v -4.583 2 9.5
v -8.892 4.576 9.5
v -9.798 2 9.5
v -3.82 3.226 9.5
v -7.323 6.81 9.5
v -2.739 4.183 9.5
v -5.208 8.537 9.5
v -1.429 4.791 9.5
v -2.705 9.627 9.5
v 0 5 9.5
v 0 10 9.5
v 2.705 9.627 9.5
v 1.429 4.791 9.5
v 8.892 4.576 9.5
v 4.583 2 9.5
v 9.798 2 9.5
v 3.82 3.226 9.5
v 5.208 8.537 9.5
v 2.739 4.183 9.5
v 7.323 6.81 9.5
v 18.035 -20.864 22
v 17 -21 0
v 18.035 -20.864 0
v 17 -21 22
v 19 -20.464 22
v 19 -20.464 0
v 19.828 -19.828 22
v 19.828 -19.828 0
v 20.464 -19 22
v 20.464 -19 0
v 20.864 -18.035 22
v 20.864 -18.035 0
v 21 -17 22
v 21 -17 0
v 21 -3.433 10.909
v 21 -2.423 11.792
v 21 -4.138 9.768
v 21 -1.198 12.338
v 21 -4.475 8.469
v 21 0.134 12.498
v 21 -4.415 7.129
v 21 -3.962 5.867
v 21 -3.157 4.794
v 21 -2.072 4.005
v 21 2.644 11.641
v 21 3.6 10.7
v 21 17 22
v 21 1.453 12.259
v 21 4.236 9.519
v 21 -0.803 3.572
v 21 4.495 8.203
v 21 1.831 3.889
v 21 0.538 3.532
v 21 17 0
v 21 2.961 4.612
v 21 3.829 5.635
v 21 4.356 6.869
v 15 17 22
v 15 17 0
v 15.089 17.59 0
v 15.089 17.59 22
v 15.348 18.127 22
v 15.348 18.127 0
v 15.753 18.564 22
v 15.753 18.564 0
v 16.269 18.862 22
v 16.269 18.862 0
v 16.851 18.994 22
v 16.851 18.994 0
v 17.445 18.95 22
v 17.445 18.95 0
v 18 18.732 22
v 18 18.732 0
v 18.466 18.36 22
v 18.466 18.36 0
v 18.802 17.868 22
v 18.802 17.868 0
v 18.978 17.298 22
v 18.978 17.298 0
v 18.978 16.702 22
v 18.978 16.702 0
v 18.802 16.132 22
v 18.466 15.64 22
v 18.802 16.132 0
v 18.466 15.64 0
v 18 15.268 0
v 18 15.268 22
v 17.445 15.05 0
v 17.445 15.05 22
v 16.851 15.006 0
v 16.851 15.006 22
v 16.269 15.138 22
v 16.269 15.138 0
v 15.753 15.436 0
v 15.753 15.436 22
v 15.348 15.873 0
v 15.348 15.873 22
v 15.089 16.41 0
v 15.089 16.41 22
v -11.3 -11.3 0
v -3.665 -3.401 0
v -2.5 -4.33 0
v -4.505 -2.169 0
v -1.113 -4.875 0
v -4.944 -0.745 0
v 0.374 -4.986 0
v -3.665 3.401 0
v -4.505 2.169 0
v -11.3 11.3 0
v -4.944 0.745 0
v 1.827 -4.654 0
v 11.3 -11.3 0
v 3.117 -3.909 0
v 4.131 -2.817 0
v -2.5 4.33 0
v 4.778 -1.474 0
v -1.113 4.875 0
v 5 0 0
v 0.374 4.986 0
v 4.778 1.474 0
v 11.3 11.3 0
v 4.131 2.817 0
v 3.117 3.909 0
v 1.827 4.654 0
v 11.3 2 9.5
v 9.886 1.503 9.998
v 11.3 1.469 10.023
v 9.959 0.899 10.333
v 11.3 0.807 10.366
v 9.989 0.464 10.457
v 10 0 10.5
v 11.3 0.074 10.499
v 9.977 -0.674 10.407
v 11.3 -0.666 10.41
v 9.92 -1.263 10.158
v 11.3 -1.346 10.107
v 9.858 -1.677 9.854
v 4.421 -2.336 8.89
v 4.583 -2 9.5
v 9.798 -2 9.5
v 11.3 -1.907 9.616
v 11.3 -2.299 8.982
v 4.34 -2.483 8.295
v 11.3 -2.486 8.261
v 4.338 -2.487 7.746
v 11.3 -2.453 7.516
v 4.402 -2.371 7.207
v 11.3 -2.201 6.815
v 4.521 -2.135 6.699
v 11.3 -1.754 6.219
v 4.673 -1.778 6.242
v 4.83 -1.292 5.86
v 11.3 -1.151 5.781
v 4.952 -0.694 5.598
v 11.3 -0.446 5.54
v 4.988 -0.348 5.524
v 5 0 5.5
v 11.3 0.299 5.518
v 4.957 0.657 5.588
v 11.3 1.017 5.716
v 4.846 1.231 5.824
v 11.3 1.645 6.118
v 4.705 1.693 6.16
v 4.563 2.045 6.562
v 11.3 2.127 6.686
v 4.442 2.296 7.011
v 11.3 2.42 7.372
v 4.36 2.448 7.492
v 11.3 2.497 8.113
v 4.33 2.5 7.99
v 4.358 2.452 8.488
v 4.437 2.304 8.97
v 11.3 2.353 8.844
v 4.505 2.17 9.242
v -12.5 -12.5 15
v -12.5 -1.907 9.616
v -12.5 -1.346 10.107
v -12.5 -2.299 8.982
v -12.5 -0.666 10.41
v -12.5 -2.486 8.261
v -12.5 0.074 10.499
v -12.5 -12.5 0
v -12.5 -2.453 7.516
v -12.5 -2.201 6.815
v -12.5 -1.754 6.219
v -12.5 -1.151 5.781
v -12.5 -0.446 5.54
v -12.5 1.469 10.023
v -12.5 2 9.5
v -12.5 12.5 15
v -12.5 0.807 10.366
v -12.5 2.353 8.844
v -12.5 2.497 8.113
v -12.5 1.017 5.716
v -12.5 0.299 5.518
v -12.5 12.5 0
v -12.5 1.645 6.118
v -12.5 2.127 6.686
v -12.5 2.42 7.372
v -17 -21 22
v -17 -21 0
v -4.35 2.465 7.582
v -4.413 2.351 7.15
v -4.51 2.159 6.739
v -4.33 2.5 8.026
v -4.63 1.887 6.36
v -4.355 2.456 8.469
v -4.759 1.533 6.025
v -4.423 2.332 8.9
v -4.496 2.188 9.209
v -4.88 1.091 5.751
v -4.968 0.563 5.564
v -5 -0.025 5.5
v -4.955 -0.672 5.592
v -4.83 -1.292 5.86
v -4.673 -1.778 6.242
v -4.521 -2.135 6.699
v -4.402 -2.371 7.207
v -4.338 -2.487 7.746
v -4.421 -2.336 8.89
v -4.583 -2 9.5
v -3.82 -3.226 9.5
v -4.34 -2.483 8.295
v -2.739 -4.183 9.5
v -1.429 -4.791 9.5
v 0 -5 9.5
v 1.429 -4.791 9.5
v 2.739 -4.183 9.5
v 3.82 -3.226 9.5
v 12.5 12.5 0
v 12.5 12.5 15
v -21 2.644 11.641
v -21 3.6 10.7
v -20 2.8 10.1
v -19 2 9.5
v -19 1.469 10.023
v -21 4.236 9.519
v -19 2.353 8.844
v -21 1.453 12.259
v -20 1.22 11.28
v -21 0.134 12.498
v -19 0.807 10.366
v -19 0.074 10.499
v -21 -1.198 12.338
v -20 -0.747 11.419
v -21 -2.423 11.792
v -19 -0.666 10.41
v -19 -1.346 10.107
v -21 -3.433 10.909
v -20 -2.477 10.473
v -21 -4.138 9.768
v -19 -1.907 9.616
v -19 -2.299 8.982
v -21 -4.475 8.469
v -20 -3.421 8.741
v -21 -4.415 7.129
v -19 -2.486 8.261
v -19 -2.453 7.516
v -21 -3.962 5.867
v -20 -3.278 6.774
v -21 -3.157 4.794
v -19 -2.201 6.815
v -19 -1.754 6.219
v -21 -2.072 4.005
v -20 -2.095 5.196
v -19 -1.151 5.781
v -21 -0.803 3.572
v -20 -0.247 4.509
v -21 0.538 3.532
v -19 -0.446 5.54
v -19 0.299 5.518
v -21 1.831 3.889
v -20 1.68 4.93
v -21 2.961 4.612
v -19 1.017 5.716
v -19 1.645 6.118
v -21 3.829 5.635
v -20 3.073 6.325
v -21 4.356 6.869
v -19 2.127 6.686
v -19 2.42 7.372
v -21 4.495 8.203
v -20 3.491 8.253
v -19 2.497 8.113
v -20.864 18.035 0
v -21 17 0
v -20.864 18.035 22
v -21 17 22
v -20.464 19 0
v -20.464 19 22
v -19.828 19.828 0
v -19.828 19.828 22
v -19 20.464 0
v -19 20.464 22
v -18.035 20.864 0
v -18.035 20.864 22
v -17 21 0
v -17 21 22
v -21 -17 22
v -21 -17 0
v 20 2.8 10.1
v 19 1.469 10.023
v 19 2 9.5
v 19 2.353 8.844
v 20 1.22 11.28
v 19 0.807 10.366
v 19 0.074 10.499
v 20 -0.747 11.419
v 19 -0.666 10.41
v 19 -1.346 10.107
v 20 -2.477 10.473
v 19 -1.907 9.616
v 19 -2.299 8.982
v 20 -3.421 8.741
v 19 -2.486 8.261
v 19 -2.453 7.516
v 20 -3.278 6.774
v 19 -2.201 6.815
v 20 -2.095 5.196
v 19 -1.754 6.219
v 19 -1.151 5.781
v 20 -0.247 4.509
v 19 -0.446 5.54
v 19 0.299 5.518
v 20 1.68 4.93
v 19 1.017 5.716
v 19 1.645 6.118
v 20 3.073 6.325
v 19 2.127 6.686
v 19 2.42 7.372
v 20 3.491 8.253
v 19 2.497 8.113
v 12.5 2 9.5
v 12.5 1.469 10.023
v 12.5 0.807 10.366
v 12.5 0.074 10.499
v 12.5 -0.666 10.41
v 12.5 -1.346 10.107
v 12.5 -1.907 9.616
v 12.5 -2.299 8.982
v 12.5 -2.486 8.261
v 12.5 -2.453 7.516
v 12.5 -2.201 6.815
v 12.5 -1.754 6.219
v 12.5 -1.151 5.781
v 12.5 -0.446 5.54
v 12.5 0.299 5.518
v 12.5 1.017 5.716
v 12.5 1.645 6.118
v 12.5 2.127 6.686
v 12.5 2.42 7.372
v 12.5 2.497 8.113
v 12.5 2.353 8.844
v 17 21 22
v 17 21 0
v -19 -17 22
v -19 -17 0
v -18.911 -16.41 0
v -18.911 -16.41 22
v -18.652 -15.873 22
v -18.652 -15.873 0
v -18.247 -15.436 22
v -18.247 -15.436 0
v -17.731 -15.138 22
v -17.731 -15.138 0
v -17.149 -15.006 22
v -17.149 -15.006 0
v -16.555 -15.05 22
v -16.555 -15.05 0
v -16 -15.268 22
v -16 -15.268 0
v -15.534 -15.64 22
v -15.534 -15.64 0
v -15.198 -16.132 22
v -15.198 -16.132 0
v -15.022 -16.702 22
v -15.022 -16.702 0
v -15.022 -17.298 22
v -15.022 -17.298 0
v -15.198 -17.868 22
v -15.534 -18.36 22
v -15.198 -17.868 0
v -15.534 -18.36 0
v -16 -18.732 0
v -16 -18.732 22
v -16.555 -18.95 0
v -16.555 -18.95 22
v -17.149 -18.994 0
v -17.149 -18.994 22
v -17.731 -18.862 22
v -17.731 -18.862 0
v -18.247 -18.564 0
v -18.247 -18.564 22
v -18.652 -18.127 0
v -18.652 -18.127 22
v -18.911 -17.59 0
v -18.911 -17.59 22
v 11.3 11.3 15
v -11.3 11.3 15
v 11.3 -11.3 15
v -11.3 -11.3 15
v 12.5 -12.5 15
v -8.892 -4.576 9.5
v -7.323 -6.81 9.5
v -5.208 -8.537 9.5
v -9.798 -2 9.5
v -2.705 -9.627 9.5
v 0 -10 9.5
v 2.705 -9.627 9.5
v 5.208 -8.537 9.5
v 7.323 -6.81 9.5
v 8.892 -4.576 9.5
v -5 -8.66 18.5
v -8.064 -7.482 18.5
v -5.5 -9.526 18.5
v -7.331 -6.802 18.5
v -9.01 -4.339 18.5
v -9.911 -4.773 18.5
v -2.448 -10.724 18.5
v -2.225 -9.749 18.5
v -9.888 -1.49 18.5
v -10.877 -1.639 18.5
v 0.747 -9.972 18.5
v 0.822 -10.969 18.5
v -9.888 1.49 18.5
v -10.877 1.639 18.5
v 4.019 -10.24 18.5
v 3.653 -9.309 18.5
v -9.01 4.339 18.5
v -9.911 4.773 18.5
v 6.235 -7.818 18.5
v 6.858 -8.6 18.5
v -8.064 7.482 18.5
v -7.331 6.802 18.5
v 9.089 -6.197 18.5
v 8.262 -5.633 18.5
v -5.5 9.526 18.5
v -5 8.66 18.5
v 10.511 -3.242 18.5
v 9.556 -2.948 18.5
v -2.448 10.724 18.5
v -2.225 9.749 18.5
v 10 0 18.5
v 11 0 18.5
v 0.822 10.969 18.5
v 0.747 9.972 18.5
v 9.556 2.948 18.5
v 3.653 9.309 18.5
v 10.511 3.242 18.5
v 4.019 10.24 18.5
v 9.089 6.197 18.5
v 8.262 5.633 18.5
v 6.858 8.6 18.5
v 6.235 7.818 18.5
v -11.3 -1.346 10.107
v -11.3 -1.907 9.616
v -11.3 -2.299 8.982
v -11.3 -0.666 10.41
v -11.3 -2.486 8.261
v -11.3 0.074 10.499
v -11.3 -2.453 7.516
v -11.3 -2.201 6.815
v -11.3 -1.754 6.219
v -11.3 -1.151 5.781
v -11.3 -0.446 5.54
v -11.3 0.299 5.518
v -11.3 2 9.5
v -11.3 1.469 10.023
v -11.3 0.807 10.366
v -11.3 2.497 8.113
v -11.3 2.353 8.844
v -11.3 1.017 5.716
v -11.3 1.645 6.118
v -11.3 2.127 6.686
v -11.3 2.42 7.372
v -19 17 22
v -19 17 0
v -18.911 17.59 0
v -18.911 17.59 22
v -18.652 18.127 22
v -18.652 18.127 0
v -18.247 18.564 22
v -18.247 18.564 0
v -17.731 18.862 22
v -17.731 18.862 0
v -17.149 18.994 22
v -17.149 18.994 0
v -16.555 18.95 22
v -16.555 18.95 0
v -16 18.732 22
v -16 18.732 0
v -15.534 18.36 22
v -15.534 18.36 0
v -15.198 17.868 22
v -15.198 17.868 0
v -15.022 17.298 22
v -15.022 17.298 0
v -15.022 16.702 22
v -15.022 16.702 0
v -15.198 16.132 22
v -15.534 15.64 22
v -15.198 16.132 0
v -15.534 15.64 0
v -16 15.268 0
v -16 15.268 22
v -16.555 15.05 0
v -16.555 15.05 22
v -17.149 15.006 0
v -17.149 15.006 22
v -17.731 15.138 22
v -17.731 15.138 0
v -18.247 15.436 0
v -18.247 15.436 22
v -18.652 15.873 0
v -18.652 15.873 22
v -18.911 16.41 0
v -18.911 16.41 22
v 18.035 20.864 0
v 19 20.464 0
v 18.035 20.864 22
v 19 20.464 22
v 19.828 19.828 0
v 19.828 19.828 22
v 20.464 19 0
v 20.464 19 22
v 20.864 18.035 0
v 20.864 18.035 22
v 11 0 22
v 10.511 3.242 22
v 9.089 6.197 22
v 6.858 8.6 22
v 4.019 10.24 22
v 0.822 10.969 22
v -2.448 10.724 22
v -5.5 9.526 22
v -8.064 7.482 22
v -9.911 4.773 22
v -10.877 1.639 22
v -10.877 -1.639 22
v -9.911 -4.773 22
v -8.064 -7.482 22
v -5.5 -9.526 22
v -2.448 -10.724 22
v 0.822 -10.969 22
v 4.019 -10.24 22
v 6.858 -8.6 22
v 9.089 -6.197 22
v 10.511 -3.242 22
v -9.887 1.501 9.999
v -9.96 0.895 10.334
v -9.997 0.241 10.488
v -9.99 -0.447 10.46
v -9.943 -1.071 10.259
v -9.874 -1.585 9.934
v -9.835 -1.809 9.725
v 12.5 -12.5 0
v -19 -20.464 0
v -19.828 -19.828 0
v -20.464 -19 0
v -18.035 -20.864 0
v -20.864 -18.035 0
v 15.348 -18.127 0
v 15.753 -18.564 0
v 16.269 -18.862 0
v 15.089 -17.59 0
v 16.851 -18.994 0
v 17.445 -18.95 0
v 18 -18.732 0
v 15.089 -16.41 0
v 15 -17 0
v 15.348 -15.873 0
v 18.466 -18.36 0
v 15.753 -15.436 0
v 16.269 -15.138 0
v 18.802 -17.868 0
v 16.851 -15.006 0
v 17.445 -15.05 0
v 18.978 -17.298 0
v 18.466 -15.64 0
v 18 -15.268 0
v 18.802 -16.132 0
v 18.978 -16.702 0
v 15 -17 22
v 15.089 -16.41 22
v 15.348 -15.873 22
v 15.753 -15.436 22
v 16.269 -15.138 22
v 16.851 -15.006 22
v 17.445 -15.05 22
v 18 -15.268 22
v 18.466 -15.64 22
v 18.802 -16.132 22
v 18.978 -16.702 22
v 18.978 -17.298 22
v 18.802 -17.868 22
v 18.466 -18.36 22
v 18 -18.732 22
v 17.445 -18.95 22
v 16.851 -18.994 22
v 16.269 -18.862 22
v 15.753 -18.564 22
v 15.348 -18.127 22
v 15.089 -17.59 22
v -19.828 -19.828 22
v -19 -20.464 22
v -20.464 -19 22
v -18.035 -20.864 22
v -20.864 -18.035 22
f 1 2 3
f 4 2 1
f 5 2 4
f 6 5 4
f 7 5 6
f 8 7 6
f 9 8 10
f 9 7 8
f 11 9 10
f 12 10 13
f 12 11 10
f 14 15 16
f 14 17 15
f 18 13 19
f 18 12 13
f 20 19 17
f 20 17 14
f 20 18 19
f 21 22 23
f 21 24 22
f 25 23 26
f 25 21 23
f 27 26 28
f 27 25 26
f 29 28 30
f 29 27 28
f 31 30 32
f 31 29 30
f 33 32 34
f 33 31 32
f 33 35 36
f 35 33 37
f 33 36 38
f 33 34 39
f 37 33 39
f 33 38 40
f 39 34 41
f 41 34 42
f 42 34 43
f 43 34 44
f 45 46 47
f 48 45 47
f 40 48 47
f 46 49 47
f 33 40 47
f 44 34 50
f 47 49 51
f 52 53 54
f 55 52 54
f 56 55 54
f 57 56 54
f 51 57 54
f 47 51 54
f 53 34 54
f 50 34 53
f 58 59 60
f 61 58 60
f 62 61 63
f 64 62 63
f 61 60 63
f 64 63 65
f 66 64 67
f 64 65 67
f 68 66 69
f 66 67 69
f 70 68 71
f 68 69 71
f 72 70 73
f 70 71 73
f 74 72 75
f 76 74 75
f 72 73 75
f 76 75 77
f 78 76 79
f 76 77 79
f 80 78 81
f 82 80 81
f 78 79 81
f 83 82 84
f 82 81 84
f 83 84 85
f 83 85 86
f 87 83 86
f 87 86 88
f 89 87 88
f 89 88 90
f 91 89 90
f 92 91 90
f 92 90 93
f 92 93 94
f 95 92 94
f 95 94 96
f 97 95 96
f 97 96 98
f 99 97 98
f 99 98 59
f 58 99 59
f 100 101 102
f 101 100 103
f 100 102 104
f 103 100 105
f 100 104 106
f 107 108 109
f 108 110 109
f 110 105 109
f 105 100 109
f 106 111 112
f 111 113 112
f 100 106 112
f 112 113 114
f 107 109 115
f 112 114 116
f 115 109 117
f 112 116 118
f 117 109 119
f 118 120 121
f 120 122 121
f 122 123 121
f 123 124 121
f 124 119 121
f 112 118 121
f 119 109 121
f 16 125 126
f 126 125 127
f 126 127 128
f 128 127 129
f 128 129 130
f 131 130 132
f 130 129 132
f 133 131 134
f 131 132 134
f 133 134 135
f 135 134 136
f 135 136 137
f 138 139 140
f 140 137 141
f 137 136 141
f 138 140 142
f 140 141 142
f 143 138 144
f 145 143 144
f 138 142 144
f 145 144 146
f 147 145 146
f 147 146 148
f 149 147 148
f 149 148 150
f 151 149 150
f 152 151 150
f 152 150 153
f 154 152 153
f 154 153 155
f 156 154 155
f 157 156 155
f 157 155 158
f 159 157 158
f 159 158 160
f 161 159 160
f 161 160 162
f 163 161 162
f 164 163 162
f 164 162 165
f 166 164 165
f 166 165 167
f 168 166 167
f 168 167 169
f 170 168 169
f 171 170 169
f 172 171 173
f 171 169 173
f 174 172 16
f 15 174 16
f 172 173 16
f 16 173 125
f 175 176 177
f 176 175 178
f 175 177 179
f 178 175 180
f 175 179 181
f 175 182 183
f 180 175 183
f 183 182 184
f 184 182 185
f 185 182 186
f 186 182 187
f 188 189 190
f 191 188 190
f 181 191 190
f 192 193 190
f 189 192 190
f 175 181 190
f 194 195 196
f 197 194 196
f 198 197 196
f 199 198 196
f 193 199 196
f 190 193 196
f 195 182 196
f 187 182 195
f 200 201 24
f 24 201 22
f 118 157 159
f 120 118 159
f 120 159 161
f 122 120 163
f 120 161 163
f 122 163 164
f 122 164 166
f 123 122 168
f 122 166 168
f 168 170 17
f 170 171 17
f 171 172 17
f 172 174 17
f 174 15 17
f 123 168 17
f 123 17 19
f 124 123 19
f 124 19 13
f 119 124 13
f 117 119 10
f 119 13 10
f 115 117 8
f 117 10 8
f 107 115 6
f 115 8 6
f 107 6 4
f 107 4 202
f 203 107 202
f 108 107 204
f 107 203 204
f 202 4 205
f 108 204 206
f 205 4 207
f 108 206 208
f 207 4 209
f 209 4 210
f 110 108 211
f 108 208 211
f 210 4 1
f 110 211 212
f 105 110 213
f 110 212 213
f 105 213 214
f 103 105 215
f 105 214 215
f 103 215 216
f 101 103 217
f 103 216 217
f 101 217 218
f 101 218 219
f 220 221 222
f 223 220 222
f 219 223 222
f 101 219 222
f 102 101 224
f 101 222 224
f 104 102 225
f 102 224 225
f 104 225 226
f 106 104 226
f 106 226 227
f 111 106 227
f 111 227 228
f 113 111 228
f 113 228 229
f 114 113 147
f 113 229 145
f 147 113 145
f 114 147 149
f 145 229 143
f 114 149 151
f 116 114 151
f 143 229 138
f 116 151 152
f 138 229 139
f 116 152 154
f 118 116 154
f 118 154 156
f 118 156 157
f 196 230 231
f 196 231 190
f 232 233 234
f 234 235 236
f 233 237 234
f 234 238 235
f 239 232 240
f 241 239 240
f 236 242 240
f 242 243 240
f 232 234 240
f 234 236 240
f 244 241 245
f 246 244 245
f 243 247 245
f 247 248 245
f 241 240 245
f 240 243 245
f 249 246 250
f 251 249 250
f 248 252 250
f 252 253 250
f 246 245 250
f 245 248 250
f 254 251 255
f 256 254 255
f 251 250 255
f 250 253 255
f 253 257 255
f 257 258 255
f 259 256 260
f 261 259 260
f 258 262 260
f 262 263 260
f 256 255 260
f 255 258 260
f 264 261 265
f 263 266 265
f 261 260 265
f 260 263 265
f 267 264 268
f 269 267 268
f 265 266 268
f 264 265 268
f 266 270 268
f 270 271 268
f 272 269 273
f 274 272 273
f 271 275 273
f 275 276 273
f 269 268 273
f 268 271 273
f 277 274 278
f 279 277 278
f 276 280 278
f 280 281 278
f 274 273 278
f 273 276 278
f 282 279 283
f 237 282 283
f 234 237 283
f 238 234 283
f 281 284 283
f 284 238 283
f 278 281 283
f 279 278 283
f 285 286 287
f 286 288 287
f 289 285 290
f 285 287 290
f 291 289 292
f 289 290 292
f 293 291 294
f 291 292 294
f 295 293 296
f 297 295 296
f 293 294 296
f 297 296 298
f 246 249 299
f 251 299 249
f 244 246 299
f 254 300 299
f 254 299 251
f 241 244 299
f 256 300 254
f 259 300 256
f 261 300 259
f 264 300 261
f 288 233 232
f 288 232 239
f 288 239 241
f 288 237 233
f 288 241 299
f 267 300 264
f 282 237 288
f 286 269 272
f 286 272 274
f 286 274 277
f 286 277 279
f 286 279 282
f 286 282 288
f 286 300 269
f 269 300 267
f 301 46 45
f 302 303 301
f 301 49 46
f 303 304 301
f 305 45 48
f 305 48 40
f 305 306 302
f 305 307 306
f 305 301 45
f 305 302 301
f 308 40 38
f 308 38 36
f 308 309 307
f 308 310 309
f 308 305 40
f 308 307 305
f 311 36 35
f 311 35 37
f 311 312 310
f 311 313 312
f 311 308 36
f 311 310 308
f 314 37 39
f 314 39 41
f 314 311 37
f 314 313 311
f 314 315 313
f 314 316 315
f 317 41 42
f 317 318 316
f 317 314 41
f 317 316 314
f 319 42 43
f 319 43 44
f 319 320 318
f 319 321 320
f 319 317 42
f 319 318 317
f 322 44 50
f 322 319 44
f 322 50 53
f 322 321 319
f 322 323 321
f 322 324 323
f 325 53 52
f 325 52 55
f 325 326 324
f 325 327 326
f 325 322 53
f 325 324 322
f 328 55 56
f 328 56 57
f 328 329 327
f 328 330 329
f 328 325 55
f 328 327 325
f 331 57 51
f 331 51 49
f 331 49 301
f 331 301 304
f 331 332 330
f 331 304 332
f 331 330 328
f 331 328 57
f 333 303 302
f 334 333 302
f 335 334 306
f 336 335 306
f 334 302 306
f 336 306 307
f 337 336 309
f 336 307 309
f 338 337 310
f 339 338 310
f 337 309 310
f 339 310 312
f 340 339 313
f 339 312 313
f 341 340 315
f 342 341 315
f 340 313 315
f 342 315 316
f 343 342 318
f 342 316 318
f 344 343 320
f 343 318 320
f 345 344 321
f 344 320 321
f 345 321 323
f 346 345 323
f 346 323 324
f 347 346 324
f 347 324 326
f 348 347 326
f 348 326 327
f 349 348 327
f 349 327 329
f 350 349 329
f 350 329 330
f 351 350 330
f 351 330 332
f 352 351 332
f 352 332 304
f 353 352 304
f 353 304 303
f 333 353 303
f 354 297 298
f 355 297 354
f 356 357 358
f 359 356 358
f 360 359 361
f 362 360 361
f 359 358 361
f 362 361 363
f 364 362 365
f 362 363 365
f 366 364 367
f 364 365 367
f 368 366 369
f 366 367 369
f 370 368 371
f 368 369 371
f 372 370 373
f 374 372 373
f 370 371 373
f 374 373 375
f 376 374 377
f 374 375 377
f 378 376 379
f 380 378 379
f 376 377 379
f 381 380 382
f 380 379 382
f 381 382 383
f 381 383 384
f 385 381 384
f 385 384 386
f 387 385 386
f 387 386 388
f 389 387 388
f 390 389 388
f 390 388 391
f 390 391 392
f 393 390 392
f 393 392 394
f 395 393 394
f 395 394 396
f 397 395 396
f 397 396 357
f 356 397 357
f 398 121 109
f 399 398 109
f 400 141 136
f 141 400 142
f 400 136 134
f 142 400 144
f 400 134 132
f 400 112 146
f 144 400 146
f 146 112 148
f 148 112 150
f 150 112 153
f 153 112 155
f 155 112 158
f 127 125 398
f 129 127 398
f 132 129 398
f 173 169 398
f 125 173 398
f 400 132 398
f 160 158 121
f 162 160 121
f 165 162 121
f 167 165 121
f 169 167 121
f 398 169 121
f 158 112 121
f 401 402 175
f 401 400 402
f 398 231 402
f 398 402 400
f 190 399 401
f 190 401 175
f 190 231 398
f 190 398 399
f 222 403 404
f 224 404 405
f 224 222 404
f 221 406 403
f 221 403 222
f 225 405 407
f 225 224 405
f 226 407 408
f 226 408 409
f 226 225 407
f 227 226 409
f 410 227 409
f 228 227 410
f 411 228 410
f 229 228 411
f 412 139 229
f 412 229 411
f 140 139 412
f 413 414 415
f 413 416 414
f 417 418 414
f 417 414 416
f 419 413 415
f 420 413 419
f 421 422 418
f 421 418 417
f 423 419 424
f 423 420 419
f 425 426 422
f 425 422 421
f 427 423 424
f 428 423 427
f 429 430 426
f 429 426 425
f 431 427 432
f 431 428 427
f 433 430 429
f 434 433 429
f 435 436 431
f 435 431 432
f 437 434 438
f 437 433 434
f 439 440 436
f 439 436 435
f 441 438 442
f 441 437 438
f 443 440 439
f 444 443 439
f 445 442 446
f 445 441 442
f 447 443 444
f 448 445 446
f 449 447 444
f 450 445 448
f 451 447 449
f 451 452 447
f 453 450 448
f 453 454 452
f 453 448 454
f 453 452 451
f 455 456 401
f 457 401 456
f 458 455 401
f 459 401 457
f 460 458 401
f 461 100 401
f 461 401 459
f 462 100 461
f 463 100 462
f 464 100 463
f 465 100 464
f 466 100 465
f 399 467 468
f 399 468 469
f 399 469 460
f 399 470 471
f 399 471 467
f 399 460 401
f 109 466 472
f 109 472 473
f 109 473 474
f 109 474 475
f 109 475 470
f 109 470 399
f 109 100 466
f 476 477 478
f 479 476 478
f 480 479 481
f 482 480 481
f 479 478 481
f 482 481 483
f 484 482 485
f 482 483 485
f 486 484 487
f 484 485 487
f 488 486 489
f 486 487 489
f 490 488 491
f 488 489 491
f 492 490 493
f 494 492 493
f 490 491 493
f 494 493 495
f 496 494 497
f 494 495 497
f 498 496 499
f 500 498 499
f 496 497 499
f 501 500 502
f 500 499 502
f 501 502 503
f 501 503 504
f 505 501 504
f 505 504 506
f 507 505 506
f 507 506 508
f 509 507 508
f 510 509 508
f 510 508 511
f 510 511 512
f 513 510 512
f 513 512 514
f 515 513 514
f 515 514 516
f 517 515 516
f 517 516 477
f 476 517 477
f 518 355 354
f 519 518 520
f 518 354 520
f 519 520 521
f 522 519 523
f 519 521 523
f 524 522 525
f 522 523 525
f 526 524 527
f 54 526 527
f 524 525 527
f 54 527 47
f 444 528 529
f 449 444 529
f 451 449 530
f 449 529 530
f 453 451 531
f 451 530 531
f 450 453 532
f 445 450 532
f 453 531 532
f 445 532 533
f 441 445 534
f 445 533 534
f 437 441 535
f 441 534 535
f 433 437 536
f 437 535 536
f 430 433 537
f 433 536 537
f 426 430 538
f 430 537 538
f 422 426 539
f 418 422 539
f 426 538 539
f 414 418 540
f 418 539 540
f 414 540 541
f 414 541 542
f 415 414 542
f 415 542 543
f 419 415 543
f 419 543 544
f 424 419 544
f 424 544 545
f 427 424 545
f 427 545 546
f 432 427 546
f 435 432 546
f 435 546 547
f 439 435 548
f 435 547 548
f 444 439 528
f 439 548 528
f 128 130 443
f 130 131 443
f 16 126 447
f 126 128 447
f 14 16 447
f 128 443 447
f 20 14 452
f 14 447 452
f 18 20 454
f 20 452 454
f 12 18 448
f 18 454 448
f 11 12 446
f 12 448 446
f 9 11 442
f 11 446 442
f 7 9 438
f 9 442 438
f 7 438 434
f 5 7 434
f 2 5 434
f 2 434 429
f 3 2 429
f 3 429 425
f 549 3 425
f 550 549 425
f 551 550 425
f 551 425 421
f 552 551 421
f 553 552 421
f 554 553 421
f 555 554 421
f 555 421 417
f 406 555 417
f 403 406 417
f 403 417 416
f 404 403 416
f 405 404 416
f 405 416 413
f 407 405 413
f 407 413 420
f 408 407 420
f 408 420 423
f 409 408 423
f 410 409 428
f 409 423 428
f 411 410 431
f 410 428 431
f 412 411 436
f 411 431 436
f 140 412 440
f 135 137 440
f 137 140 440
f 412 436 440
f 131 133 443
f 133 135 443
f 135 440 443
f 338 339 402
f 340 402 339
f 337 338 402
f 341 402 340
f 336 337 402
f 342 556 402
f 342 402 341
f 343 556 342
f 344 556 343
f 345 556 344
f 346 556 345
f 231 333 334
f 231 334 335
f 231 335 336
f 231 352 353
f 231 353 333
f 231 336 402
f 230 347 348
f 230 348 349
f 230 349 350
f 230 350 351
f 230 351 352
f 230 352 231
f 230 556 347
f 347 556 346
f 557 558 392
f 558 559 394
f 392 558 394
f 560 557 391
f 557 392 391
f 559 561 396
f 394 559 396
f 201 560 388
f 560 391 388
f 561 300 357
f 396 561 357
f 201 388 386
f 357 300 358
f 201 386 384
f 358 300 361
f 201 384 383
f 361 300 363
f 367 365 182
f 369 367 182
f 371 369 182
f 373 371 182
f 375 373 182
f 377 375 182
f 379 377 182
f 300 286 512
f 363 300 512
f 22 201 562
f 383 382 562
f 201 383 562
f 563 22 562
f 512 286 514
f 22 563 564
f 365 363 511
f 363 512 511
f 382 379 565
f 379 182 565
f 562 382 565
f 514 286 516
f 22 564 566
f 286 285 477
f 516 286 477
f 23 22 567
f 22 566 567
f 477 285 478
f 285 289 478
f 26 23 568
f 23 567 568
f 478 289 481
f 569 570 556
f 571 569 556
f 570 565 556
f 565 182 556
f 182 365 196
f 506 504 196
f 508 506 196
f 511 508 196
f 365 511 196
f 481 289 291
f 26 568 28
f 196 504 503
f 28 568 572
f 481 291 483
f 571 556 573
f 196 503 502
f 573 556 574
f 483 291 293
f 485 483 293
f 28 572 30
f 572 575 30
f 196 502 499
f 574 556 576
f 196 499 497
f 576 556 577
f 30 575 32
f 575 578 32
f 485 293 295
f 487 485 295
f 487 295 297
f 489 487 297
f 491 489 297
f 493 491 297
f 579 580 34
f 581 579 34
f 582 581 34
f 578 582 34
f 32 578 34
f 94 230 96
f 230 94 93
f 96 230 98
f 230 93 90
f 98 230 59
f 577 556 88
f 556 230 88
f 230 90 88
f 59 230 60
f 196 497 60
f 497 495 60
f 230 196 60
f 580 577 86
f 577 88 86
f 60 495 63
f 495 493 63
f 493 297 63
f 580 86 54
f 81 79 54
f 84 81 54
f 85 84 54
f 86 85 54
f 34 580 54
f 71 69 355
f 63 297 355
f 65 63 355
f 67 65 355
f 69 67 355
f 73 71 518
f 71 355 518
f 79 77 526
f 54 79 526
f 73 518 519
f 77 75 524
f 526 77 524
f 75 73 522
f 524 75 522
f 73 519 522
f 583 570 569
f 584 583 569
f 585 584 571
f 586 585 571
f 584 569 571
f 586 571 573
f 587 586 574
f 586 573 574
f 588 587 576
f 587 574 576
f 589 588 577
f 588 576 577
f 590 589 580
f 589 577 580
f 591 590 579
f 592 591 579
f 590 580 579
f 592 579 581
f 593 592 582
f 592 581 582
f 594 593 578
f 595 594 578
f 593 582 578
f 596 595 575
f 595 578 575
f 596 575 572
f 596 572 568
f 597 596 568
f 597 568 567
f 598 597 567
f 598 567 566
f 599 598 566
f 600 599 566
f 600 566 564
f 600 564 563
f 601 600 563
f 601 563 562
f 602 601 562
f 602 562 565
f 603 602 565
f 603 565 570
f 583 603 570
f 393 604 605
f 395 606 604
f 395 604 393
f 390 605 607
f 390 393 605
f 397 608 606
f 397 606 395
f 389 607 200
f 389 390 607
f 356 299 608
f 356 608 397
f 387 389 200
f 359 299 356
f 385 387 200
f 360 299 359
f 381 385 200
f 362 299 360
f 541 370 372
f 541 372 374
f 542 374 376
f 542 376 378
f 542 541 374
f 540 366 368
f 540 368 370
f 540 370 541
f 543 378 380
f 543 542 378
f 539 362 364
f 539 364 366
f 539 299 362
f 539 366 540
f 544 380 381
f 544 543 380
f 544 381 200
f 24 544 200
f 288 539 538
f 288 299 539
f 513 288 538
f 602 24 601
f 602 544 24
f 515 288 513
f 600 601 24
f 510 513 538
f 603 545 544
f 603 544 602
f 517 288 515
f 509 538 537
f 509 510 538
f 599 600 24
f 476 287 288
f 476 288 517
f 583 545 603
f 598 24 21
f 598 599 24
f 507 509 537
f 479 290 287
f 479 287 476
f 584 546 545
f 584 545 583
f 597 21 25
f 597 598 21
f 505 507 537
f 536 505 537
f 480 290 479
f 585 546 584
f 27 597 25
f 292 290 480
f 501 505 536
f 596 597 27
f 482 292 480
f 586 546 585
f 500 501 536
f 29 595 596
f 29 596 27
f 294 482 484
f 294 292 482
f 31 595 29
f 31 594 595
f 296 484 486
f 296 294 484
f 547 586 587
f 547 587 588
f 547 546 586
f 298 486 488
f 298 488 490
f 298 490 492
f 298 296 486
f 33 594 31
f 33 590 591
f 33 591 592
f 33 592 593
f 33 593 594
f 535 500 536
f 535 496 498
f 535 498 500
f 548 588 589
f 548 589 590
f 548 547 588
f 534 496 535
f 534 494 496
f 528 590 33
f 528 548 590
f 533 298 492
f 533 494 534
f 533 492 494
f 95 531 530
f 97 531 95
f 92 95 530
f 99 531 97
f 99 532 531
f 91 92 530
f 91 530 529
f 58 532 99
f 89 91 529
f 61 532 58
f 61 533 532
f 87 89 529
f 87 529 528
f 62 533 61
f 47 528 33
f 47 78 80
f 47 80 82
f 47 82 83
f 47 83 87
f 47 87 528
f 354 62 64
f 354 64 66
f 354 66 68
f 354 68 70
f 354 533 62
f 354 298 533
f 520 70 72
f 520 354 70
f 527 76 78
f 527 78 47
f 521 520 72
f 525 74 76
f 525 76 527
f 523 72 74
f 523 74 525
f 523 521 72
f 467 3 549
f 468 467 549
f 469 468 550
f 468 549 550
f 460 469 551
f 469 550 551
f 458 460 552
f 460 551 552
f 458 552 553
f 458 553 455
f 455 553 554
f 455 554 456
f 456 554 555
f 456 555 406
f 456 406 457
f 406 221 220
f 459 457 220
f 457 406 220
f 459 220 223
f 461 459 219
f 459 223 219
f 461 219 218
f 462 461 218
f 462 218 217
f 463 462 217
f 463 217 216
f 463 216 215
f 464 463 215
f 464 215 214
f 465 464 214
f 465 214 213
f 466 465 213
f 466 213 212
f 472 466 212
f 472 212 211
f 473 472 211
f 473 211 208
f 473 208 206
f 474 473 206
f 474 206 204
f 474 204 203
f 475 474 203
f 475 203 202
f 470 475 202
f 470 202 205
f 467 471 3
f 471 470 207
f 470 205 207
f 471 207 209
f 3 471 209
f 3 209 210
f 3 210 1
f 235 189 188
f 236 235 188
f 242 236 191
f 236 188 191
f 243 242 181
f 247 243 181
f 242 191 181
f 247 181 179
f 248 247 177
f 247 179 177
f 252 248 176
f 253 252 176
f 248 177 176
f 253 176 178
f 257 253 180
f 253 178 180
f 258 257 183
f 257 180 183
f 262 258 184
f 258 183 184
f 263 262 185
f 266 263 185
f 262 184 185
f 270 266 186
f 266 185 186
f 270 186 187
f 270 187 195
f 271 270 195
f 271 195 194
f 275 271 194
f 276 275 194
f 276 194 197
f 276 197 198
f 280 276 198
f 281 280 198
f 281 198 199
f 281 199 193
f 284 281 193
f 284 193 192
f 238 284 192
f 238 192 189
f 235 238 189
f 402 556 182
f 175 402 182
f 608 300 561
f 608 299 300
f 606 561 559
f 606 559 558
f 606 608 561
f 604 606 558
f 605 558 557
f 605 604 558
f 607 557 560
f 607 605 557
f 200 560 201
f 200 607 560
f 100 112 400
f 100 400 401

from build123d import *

# Parameters (mm, degrees)
CROQUIS1_W              = 42
CROQUIS1_H              = 42
SALIENTE_EXTRUIR1_DEPTH = 22
CROQUIS2_W              = 25
CROQUIS2_H              = 25
CROQUIS2_W_2            = 22.6
CROQUIS2_H_2            = 22.6
CORTAR_EXTRUIR1_DEPTH   = 15
CROQUIS3_R              = 5
CORTAR_EXTRUIR2_DEPTH   = 37.959437225
CROQUIS4_R              = 11
CORTAR_EXTRUIR3_DEPTH   = 3.5
CROQUIS5_R              = 10
CORTAR_EXTRUIR4_DEPTH   = 9
CROQUIS6_R              = 2
CORTAR_EXTRUIR5_DEPTH   = 37.959437225
REDONDEO1_R             = 4
CROQUIS7_R              = 2.5
CORTAR_EXTRUIR7_DEPTH   = 52.85556865
CHAFL_N1_SIZE           = 2


with BuildPart() as part:
    # Croquis1 → Saliente-Extruir1 (new body)
    with BuildSketch(Plane.XY):
        Rectangle(CROQUIS1_W, CROQUIS1_H)
    extrude(amount=SALIENTE_EXTRUIR1_DEPTH)

    # Croquis2 → Cortar-Extruir1 (cut)
    with BuildSketch(Plane(origin=(0, 0, 0), x_dir=(-1, 0, 0), z_dir=(0, 0, -1))):
        Rectangle(CROQUIS2_W, CROQUIS2_H)
        Rectangle(CROQUIS2_W_2, CROQUIS2_H_2, mode=Mode.SUBTRACT)
    extrude(amount=-CORTAR_EXTRUIR1_DEPTH, mode=Mode.SUBTRACT)

    # Croquis3 → Cortar-Extruir2 (cut, through all)
    with BuildSketch(Plane.XY.offset(22)):
        Circle(CROQUIS3_R)
    extrude(amount=-CORTAR_EXTRUIR2_DEPTH, mode=Mode.SUBTRACT)

    # Croquis4 → Cortar-Extruir3 (cut)
    with BuildSketch(Plane.XY.offset(22)):
        Circle(CROQUIS4_R)
    extrude(amount=-CORTAR_EXTRUIR3_DEPTH, mode=Mode.SUBTRACT)

    # Croquis5 → Cortar-Extruir4 (cut)
    with BuildSketch(Plane.XY.offset(18.5)):
        Circle(CROQUIS5_R)
    extrude(amount=-CORTAR_EXTRUIR4_DEPTH, mode=Mode.SUBTRACT)

    # Croquis6 → Cortar-Extruir5 (cut, through all)
    with BuildSketch(Plane(origin=(0, 0, 0), x_dir=(-1, 0, 0), z_dir=(0, 0, -1))):
        with Locations((17, 17)):
            Circle(CROQUIS6_R)
        with Locations((-17, 17)):
            Circle(CROQUIS6_R)
        with Locations((-17, -17)):
            Circle(CROQUIS6_R)
        with Locations((17, -17)):
            Circle(CROQUIS6_R)
    extrude(amount=-CORTAR_EXTRUIR5_DEPTH, mode=Mode.SUBTRACT)

    # Redondeo1
    redondeo1_edges = [part.edges().sort_by_distance(p)[0] for p in [
        (21, -21, 11),
        (-21, -21, 11),
        (-21, 21, 11),
        (21, 21, 11),
    ]]
    fillet(redondeo1_edges, radius=REDONDEO1_R)

    # Croquis7 → Cortar-Extruir7 (cut, through all)
    with BuildSketch(Plane(origin=(21, 0, 0), x_dir=(0, 0, -1), z_dir=(1, 0, 0))):
        with Locations(Location((-8, 0, 0), (0, 0, 126.869897646))):
            Circle(CROQUIS7_R)
    extrude(amount=-CORTAR_EXTRUIR7_DEPTH, mode=Mode.SUBTRACT)

    # Chaflán1
    chafl_n1_edges = [part.edges().sort_by_distance(p)[0] for p in [
        (-21, -2, 6.5),
        (21, -2, 6.5),
    ]]
    chamfer(chafl_n1_edges, length=CHAFL_N1_SIZE)


solid = part.part
